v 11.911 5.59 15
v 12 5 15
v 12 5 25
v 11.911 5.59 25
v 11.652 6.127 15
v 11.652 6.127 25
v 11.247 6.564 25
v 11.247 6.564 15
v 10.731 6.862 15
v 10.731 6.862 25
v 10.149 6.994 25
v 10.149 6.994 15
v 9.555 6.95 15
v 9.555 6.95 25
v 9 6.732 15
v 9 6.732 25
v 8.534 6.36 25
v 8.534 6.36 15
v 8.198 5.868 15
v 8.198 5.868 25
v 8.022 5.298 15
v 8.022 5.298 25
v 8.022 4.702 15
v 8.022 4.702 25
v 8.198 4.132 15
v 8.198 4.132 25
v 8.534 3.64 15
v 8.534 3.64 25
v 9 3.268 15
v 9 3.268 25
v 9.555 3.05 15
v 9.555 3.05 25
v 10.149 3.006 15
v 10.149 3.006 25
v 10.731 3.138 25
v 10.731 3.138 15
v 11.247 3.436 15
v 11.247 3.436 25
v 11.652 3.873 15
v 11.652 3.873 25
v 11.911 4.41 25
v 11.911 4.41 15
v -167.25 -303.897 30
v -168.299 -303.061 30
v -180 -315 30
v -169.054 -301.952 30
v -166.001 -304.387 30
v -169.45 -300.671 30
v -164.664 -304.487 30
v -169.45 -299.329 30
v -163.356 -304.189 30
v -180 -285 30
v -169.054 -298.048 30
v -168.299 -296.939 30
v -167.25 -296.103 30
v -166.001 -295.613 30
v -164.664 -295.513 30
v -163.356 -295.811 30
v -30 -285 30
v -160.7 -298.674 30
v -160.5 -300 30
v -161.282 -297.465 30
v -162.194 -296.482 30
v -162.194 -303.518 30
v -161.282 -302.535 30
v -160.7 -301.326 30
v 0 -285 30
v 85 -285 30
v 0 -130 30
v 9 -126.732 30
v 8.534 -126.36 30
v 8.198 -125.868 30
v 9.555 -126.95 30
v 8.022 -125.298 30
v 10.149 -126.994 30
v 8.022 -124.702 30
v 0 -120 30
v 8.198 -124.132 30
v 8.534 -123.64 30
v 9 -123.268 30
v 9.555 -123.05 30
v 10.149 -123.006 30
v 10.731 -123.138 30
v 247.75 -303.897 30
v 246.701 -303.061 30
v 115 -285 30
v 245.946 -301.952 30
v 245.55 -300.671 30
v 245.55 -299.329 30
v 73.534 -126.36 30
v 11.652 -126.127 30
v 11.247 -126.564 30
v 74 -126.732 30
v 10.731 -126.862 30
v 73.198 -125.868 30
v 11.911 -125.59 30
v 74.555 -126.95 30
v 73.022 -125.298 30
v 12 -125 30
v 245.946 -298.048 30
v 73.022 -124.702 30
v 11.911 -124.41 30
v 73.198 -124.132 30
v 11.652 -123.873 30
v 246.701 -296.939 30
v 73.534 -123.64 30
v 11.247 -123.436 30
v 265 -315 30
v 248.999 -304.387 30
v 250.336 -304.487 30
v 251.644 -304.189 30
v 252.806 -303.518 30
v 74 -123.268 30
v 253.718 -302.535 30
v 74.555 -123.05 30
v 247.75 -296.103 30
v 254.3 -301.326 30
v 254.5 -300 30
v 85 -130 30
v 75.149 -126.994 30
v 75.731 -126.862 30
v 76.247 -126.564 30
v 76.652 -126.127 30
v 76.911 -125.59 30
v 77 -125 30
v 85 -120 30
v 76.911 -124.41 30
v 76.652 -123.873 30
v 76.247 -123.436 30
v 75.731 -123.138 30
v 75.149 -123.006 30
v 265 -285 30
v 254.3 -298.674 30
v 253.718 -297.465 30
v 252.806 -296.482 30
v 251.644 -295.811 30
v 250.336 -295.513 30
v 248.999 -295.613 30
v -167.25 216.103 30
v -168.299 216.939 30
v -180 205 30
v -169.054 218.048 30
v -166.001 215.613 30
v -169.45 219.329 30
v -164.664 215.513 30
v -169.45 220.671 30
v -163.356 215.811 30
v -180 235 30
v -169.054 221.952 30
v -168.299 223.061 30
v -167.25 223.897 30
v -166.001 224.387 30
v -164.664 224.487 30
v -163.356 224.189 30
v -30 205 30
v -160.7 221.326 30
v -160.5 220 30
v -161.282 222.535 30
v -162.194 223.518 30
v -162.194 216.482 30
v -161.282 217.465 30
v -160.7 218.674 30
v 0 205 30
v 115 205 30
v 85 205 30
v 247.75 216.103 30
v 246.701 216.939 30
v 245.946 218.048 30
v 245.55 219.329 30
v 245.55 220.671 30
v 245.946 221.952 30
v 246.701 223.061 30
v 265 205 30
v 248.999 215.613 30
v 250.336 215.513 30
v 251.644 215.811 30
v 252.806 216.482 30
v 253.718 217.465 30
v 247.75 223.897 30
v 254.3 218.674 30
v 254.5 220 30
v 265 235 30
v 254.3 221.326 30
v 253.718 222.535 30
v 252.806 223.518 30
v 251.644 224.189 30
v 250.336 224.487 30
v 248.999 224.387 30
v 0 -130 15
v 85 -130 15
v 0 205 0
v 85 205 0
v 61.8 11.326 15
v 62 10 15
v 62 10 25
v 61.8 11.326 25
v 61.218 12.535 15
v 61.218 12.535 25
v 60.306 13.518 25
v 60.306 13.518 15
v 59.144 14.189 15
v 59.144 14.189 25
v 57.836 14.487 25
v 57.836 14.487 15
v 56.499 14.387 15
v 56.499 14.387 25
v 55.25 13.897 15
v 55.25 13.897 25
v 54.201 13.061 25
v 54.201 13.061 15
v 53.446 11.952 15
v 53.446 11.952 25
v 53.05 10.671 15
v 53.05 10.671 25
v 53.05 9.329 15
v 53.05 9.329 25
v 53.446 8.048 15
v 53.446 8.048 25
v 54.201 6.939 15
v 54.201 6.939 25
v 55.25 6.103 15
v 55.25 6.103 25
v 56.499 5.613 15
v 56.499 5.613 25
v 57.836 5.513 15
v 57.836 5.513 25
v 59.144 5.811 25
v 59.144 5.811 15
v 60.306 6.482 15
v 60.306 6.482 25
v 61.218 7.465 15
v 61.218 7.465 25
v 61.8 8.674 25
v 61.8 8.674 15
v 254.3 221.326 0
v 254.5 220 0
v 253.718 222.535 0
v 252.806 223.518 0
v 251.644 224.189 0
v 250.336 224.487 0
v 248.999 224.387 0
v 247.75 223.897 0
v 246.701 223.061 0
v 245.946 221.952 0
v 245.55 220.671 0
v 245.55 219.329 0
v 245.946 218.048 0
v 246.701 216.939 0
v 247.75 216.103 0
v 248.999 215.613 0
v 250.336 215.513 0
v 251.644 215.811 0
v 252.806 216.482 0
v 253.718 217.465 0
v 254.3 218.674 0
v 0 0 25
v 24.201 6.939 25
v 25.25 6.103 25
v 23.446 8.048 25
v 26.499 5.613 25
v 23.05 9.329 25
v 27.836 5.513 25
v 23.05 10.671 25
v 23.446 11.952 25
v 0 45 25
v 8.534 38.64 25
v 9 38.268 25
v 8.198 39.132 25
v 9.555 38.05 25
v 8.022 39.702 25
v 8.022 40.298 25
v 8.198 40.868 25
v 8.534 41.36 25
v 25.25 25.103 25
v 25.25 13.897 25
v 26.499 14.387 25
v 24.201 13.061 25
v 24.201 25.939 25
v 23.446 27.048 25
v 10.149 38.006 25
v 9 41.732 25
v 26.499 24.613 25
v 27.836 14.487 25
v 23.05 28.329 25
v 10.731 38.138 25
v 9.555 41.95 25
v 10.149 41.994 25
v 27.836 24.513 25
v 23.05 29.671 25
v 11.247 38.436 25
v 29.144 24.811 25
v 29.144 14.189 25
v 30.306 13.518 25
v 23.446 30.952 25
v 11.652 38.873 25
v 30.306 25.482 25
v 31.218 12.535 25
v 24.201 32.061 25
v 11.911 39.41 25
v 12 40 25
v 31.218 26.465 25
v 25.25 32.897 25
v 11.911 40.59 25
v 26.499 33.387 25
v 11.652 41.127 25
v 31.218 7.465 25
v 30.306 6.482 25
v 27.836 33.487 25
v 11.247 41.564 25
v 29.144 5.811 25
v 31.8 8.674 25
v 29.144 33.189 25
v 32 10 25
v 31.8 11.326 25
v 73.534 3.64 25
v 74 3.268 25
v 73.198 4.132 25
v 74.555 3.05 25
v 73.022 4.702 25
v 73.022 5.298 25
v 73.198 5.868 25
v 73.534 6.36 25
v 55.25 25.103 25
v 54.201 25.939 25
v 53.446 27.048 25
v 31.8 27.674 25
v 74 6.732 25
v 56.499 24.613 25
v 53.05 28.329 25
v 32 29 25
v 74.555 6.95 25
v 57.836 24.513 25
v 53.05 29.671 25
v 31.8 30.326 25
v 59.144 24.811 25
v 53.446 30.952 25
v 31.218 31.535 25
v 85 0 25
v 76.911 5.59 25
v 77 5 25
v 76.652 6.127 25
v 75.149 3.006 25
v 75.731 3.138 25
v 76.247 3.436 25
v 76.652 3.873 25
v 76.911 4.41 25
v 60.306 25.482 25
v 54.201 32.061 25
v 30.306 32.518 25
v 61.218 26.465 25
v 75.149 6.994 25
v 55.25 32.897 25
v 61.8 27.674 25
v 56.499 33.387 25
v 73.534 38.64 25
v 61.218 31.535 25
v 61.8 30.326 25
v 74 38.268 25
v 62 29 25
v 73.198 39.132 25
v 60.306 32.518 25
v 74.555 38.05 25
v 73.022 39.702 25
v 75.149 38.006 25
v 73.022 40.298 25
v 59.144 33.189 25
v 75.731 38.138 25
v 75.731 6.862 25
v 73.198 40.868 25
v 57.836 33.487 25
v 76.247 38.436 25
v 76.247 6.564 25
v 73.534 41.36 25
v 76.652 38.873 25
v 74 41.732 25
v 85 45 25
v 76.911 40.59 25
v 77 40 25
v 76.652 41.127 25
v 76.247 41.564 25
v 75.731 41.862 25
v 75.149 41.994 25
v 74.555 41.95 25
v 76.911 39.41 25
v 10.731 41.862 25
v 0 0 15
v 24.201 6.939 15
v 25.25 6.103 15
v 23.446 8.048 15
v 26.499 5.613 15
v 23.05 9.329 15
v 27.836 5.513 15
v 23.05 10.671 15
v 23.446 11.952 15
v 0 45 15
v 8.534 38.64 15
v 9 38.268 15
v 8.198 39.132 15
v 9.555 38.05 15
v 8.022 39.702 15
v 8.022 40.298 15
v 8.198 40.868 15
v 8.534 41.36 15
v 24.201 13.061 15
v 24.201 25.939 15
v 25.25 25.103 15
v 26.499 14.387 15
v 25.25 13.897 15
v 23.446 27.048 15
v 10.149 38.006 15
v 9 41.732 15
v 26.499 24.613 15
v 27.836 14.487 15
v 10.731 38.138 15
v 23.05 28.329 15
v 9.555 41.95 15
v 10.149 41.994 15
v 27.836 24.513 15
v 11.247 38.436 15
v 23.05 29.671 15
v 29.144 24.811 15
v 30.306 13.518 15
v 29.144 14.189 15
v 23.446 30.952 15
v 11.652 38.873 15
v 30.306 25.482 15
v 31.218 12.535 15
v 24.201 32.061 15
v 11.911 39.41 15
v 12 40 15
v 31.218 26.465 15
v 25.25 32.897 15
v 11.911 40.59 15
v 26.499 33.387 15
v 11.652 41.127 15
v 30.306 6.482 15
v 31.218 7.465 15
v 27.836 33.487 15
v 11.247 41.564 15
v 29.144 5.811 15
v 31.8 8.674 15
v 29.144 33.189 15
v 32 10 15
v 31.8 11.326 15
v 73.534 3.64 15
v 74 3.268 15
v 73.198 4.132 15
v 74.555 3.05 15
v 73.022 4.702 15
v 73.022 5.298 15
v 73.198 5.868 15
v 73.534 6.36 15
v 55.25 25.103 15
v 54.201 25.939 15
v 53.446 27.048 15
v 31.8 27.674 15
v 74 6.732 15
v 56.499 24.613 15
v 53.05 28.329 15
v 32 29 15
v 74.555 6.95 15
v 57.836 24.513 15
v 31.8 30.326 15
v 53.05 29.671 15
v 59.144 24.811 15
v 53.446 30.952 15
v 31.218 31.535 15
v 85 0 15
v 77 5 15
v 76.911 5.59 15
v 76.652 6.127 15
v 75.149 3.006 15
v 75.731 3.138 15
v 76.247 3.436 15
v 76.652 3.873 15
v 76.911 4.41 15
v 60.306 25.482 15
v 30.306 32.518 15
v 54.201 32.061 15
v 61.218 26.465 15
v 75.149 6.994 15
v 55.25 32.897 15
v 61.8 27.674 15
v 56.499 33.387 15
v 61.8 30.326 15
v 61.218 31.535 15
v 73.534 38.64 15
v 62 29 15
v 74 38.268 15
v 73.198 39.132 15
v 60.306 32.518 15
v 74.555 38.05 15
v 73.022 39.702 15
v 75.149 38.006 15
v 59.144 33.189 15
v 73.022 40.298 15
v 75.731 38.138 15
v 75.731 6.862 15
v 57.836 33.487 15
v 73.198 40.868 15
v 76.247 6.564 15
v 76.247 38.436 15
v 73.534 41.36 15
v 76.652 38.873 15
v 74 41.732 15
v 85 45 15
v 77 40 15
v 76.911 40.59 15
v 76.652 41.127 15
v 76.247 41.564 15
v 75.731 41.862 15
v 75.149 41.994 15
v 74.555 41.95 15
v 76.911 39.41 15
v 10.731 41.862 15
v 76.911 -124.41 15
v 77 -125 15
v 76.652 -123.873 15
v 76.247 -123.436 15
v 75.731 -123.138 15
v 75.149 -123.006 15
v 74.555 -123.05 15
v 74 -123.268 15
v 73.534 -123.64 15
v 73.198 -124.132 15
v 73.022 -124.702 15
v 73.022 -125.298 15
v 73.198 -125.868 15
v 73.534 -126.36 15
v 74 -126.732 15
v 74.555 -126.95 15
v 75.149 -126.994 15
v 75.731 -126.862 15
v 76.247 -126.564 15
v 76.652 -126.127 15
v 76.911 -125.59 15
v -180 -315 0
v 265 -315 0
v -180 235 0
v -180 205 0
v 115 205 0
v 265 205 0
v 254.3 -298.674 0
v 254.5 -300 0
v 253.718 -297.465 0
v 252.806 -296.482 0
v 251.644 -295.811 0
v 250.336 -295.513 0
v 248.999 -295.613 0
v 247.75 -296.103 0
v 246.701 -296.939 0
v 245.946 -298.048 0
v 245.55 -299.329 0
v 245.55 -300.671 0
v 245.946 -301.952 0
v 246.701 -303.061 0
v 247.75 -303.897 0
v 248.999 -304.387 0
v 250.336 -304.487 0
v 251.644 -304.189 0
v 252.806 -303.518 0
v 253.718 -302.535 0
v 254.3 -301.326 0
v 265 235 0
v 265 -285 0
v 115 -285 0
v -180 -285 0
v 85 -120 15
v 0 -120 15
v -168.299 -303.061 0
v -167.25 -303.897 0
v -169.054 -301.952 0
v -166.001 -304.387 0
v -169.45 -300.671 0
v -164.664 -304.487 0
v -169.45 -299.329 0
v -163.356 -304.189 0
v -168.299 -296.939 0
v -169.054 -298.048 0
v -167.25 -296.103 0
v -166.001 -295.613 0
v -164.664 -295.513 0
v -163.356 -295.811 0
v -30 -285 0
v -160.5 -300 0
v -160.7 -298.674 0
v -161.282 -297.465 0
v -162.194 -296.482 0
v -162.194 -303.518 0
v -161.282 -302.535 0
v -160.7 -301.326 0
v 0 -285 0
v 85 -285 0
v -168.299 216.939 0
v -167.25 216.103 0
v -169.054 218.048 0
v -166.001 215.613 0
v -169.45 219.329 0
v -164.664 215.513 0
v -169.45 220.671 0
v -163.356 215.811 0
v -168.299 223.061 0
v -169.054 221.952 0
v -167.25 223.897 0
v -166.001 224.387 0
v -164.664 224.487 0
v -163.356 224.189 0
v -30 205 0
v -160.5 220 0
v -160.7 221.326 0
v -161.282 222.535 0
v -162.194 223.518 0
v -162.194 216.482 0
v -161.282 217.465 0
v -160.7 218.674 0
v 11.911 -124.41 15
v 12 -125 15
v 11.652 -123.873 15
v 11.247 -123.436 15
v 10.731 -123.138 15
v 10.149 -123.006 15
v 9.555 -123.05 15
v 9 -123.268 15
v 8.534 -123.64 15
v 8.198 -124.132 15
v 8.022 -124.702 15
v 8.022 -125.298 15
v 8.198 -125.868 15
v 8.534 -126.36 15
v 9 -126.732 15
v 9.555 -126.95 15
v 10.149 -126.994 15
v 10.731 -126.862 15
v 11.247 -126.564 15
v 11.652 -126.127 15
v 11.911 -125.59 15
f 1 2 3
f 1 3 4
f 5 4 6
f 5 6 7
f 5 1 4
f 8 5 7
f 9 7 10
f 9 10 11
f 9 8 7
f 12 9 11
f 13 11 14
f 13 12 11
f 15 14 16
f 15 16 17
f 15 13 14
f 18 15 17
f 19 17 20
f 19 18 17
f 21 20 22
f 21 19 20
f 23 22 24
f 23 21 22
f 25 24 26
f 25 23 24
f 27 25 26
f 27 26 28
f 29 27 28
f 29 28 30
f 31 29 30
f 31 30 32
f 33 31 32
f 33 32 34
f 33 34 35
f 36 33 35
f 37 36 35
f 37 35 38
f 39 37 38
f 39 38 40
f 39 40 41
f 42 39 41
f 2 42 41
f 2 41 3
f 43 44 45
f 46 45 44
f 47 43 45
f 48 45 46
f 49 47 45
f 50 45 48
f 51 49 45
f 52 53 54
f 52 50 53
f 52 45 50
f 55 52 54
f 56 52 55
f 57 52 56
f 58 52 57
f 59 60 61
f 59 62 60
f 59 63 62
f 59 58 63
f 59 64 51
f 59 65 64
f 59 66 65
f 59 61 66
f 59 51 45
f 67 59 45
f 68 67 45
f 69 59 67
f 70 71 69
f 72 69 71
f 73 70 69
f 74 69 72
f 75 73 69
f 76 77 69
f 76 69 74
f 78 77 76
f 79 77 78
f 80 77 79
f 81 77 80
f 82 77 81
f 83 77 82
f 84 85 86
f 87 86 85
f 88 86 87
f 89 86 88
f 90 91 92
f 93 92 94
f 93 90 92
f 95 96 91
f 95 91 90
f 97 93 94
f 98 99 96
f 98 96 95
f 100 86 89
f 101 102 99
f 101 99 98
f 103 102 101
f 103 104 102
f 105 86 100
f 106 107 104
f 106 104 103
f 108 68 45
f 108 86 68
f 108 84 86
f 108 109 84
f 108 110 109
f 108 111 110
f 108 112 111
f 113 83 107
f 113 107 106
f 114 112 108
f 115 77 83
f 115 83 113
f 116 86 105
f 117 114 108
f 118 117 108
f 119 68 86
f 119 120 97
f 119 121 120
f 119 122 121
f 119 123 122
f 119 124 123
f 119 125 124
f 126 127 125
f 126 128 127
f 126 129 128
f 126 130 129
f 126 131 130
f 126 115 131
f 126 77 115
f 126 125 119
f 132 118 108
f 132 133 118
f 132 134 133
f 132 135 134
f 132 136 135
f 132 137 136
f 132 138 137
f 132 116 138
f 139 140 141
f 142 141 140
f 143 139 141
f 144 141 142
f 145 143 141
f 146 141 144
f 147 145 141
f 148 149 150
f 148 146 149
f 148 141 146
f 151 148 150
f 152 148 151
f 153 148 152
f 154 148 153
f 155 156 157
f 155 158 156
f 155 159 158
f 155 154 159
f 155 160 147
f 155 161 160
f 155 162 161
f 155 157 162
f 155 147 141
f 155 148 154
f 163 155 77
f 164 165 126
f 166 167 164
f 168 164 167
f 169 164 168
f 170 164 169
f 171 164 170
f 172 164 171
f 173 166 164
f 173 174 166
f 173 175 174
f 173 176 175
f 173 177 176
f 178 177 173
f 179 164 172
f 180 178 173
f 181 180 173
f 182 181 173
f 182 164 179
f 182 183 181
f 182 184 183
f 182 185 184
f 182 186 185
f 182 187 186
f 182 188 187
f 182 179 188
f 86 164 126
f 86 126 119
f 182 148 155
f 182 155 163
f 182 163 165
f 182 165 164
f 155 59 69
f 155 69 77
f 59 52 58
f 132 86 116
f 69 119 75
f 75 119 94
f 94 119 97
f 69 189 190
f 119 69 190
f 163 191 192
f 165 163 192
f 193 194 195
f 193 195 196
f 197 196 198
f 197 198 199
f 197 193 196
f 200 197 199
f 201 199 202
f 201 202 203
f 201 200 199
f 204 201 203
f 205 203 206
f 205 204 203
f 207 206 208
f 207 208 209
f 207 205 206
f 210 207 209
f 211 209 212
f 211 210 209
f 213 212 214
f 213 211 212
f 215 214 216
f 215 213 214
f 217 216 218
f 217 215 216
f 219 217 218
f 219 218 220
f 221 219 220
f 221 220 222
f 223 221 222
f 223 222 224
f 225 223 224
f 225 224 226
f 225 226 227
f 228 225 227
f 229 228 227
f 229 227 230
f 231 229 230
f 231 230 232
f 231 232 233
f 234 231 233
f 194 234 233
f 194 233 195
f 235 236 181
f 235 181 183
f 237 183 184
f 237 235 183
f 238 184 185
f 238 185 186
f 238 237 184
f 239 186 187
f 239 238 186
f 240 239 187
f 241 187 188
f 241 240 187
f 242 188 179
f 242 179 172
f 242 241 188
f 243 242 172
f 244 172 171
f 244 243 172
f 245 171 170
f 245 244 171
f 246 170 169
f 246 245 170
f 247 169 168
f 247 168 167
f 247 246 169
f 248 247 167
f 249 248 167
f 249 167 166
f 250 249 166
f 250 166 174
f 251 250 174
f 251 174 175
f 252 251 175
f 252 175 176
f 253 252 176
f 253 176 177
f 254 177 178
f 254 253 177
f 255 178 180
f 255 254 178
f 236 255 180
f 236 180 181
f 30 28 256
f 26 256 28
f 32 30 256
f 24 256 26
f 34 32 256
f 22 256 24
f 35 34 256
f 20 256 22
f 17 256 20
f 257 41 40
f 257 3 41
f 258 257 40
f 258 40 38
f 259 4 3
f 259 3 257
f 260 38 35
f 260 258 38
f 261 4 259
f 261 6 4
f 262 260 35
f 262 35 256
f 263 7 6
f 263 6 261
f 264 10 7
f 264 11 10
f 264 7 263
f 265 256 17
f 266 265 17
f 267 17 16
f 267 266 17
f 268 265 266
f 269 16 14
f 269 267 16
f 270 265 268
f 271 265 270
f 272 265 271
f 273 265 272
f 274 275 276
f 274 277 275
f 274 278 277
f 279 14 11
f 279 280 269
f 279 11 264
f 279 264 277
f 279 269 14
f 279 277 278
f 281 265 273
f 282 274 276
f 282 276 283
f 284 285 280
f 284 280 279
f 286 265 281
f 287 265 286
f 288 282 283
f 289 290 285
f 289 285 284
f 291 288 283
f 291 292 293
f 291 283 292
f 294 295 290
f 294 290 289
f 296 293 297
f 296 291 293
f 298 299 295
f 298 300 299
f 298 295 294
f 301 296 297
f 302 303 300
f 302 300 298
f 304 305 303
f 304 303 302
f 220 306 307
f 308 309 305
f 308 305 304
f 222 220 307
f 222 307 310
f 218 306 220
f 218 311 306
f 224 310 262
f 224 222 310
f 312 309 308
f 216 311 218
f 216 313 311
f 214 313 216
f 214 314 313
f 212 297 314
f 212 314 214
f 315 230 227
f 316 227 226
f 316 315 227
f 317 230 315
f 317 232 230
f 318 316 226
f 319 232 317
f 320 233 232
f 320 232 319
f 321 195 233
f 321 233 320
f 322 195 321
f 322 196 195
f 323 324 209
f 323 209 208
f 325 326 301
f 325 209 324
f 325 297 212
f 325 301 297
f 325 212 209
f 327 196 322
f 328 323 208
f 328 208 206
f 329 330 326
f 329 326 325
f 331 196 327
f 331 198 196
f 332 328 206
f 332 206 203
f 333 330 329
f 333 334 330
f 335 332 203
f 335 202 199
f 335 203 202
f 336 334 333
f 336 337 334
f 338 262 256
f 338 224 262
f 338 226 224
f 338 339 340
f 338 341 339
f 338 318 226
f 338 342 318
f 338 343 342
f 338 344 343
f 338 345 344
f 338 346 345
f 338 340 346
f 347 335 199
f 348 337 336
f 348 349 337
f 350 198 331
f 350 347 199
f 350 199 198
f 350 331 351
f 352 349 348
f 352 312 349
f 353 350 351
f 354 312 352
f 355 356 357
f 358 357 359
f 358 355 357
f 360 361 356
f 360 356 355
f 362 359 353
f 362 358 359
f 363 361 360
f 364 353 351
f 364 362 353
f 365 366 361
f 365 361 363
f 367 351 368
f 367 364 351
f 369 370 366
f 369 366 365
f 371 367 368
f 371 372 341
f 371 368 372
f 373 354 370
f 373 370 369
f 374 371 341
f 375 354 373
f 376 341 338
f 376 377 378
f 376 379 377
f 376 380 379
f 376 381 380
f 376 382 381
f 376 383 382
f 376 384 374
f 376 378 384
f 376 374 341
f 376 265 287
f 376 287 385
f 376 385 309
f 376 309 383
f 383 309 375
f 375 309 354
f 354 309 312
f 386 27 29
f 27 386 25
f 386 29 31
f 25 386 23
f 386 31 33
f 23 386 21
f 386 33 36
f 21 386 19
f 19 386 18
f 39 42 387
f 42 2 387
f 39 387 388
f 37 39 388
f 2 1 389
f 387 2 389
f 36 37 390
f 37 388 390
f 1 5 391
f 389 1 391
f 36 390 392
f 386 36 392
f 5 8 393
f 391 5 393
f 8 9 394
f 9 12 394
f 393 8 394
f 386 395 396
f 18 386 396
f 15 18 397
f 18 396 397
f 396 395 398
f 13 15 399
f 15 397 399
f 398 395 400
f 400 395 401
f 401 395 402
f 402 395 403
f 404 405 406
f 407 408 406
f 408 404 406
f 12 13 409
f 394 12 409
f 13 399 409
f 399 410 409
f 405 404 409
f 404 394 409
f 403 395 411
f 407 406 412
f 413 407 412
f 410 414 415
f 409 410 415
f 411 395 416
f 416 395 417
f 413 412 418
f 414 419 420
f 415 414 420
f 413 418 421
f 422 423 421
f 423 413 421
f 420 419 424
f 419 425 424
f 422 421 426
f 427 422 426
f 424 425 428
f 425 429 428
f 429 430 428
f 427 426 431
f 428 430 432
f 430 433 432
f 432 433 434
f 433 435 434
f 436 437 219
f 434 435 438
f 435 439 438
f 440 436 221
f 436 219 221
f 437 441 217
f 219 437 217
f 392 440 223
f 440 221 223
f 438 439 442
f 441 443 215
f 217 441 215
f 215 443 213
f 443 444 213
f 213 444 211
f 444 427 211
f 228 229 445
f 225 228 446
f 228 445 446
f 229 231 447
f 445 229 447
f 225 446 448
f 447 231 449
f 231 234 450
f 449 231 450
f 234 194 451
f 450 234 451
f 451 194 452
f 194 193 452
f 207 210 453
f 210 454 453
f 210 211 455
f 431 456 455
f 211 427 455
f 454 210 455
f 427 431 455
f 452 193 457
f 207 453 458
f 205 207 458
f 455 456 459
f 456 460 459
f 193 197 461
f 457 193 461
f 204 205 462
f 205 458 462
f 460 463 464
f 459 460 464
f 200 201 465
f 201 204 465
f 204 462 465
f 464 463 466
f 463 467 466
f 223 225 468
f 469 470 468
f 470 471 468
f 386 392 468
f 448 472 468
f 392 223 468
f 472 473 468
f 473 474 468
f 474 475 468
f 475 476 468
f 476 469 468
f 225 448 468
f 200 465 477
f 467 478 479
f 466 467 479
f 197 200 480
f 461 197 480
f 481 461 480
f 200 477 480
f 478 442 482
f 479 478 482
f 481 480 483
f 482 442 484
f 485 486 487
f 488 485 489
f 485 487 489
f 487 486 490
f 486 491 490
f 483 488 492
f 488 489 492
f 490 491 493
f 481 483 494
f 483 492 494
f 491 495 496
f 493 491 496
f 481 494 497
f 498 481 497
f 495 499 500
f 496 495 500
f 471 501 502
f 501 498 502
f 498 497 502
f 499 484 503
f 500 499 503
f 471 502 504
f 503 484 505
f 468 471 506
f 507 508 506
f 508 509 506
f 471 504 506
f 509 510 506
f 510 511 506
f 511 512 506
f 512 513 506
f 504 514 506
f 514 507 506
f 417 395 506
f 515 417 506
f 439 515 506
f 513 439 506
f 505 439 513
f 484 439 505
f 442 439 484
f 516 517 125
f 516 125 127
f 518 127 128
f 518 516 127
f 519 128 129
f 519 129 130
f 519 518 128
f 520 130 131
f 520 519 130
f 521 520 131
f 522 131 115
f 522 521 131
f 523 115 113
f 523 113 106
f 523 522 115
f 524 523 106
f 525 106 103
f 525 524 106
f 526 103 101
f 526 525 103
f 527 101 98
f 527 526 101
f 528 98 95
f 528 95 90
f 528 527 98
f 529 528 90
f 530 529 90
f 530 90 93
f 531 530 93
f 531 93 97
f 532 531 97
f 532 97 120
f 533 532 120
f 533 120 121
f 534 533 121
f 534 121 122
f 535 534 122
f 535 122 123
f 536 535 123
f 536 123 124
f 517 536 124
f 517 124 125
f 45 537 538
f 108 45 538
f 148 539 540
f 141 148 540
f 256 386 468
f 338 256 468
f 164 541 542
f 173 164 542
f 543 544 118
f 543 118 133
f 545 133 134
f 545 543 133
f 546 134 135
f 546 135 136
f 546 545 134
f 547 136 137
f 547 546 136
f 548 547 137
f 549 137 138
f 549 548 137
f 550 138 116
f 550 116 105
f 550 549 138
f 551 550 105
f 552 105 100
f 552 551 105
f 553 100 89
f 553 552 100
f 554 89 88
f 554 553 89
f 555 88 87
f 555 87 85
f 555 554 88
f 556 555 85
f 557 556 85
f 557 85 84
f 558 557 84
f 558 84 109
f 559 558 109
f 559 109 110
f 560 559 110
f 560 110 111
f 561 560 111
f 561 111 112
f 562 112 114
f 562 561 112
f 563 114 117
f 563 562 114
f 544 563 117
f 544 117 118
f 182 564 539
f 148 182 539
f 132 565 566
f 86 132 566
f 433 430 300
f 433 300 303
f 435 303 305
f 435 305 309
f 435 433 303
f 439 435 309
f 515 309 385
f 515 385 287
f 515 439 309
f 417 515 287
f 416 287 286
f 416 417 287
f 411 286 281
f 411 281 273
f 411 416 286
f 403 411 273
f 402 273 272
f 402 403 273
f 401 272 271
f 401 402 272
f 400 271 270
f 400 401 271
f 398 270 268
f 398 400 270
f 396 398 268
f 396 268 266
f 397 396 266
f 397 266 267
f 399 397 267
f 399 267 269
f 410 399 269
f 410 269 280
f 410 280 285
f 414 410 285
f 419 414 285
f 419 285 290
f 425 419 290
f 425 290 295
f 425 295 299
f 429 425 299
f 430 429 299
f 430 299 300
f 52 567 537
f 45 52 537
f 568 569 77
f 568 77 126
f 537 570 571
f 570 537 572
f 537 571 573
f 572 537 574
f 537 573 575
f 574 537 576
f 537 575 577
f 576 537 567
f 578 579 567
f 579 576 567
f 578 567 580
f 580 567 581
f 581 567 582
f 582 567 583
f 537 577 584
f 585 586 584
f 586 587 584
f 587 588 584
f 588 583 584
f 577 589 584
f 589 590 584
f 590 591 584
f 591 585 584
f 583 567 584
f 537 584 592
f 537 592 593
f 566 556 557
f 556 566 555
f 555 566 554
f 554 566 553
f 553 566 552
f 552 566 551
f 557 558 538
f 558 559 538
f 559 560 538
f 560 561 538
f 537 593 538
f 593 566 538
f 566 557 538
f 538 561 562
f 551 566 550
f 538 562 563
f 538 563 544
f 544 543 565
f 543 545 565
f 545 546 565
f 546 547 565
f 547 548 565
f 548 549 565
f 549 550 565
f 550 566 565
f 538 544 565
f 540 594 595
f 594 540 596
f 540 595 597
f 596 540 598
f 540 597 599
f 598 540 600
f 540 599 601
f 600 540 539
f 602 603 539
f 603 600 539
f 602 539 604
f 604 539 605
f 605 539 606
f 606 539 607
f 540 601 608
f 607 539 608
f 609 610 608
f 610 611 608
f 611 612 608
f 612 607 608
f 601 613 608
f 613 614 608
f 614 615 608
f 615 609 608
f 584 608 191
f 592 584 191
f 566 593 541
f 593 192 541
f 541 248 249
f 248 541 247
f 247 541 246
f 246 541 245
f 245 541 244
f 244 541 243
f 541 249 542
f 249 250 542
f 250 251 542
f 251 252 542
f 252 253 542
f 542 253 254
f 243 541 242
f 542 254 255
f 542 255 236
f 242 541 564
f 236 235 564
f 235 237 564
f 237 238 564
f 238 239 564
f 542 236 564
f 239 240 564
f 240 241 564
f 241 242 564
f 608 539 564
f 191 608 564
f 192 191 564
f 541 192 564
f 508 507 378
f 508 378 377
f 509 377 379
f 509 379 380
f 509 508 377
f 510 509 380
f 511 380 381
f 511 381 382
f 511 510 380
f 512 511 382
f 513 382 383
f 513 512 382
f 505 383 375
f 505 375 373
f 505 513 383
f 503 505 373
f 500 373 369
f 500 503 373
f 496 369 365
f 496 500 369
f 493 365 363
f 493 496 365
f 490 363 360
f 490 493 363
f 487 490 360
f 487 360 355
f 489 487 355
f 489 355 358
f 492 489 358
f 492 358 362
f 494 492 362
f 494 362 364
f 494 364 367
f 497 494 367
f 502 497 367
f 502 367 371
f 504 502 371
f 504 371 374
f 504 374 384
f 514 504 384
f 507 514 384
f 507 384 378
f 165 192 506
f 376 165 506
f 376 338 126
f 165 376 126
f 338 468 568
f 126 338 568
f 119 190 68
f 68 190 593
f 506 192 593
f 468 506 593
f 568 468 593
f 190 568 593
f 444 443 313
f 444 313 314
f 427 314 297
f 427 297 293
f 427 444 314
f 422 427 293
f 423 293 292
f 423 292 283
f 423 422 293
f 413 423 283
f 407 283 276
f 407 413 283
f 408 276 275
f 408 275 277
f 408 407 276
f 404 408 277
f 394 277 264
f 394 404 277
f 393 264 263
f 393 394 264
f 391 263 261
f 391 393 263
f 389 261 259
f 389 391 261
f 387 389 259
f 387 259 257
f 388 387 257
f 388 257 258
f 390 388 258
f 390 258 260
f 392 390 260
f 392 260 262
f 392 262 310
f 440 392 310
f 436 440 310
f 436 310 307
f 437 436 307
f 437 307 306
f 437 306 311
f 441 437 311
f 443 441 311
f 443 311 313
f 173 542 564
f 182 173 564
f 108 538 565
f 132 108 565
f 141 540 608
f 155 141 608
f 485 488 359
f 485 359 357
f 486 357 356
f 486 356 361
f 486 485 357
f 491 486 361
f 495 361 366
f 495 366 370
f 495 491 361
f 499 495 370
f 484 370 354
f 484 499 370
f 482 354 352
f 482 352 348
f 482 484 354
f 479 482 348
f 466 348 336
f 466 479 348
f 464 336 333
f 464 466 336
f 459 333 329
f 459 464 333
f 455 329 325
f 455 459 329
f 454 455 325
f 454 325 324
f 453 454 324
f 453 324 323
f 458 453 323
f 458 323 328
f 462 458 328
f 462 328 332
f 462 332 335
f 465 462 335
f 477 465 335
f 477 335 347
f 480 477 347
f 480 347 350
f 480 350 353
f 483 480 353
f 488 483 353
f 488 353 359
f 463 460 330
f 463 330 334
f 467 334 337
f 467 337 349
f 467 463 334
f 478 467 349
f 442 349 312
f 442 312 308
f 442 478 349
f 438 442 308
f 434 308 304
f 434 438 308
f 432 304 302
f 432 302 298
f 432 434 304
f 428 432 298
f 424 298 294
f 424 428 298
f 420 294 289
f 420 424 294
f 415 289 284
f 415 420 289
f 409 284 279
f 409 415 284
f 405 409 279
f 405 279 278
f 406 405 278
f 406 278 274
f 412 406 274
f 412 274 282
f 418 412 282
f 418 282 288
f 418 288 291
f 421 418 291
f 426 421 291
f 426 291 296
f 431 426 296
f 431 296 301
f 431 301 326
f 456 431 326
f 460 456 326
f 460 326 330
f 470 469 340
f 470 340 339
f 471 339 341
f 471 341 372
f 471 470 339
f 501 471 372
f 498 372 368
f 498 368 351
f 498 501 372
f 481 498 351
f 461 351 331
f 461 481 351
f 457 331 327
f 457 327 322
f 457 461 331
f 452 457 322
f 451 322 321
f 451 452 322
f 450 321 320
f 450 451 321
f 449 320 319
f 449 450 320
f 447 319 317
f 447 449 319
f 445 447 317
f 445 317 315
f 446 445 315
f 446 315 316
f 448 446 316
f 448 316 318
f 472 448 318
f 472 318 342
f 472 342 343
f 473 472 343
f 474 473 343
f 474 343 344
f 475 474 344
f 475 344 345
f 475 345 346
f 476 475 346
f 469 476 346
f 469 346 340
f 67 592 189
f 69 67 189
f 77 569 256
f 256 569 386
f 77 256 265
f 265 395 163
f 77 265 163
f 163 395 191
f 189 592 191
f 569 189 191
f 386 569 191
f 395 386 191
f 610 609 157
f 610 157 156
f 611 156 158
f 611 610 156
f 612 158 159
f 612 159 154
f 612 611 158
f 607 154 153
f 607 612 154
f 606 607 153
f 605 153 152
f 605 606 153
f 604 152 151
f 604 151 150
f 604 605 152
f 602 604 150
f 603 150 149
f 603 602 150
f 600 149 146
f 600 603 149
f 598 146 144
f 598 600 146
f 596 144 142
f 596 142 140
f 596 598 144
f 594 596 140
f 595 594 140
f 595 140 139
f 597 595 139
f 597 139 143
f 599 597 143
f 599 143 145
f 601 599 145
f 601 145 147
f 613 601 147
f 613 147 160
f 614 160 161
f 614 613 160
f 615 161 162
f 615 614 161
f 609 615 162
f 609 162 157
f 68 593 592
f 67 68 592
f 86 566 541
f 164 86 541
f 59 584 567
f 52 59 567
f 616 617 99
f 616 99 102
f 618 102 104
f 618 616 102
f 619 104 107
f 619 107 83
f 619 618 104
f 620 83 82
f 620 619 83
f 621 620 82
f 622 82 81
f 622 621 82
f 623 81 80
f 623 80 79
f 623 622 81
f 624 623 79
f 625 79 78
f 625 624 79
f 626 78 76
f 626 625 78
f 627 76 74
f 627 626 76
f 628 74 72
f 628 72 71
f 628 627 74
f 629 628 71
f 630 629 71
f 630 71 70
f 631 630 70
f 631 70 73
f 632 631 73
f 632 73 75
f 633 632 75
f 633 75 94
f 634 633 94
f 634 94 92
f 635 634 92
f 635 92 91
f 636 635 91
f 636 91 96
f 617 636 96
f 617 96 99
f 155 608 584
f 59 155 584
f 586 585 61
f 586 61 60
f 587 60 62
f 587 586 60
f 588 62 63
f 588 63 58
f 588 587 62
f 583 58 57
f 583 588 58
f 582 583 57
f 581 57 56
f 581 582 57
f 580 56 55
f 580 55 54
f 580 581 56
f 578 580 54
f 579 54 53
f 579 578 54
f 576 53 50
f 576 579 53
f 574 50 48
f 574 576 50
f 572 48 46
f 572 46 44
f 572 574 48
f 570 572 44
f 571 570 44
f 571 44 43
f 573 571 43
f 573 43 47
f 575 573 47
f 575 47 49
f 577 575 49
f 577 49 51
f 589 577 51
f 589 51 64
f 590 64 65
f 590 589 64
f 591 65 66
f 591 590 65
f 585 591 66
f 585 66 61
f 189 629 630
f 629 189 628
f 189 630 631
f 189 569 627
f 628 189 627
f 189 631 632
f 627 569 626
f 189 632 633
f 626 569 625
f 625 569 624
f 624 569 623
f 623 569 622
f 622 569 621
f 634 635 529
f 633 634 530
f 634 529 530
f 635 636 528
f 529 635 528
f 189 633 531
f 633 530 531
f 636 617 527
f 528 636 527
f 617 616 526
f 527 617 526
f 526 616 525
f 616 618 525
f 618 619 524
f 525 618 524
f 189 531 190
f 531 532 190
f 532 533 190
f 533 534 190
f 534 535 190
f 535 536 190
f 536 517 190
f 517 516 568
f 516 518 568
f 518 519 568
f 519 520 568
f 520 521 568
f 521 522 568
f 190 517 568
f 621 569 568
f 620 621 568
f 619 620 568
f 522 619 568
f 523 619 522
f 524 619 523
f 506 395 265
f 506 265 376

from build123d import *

# Parameters (mm, degrees)
F0_R     = 4.5
F0_W     = 85
F0_H     = 160
F0_H_2   = 10
F0_R_2   = 2
F1_DEPTH = 30
F2_W     = 85
F2_H     = 40
F2_R     = 4.5
F2_H_2   = 5
F3_DEPTH = 5
F4_W     = 85
F4_H     = 45
F4_R     = 2
F4_R_2   = 6
F5_DEPTH = 15
F4_R_3   = 4.5
F6_DEPTH = 15
F7_DEPTH = 25


with BuildPart() as f1:
    # F0 (on Top) → F1 (new body)
    with BuildSketch(Plane.XY):
        Polygon((115, -285), (115, 205), (265, 205), (265, 235), (-180, 235), (-180, 205), (-30, 205), (-30, -285), (-180, -285), (-180, -315), (265, -315), (265, -285), align=None)
        with Locations((-165, -300)):
            Circle(F0_R, mode=Mode.SUBTRACT)
        with Locations((250, -300)):
            Circle(F0_R, mode=Mode.SUBTRACT)
        Polygon((0, -120), (0, 0), (85, 0), (85, -120), (85, -130), (85, -285), (0, -285), (0, -130), align=None, mode=Mode.SUBTRACT)
        with Locations((27.5, 10)):
            Circle(F0_R, mode=Mode.SUBTRACT)
        with Locations((27.5, 29)):
            Circle(F0_R, mode=Mode.SUBTRACT)
        with Locations((-165, 220)):
            Circle(F0_R, mode=Mode.SUBTRACT)
        with Locations((57.5, 10)):
            Circle(F0_R, mode=Mode.SUBTRACT)
        with Locations((57.5, 29)):
            Circle(F0_R, mode=Mode.SUBTRACT)
        with Locations((42.5, 125)):
            Rectangle(F0_W, F0_H, mode=Mode.SUBTRACT)
        with Locations((250, 220)):
            Circle(F0_R, mode=Mode.SUBTRACT)
        with Locations((42.5, -125)):
            Rectangle(F0_W, F0_H_2)
        with Locations((10, -125)):
            Circle(F0_R_2, mode=Mode.SUBTRACT)
        with Locations((75, -125)):
            Circle(F0_R_2, mode=Mode.SUBTRACT)
    extrude(amount=F1_DEPTH)

    # F2 (on face) → F3 (cut)
    with BuildSketch(Plane.XY.offset(30)):
        with Locations((42.5, 20)):
            Rectangle(F2_W, F2_H)
        with Locations((27.5, 10)):
            Circle(F2_R, mode=Mode.SUBTRACT)
        with Locations((27.5, 29)):
            Circle(F2_R, mode=Mode.SUBTRACT)
        with Locations((57.5, 10)):
            Circle(F2_R, mode=Mode.SUBTRACT)
        with Locations((57.5, 29)):
            Circle(F2_R, mode=Mode.SUBTRACT)
        with Locations((42.5, 42.5)):
            Rectangle(F2_W, F2_H_2)
    extrude(amount=-F3_DEPTH, mode=Mode.SUBTRACT)

    # F4 (on face) + F0 (on Top) → F5 (cut)
    with BuildSketch(Plane.XY):
        with Locations((42.5, 22.5)):
            Rectangle(F4_W, F4_H)
        with Locations((10, 5)):
            Circle(F4_R, mode=Mode.SUBTRACT)
        with Locations((27.5, 10)):
            Circle(F4_R_2, mode=Mode.SUBTRACT)
        with Locations((10, 40)):
            Circle(F4_R, mode=Mode.SUBTRACT)
        with Locations((27.5, 29)):
            Circle(F4_R_2, mode=Mode.SUBTRACT)
        with Locations((57.5, 10)):
            Circle(F4_R_2, mode=Mode.SUBTRACT)
        with Locations((75, 5)):
            Circle(F4_R, mode=Mode.SUBTRACT)
        with Locations((57.5, 29)):
            Circle(F4_R_2, mode=Mode.SUBTRACT)
        with Locations((75, 40)):
            Circle(F4_R, mode=Mode.SUBTRACT)
    with BuildSketch(Plane.XY):
        with Locations((42.5, -125)):
            Rectangle(F0_W, F0_H_2)
        with Locations((10, -125)):
            Circle(F0_R_2, mode=Mode.SUBTRACT)
        with Locations((75, -125)):
            Circle(F0_R_2, mode=Mode.SUBTRACT)
    extrude(amount=F5_DEPTH, mode=Mode.SUBTRACT)

    # F4 (on face) → F6 (cut)
    with BuildSketch(Plane.XY):
        with Locations((27.5, 10)):
            Circle(F4_R_2)
        with Locations((27.5, 10)):
            Circle(F4_R_3, mode=Mode.SUBTRACT)
        with Locations((57.5, 10)):
            Circle(F4_R_2)
        with Locations((57.5, 10)):
            Circle(F4_R_3, mode=Mode.SUBTRACT)
        with Locations((57.5, 29)):
            Circle(F4_R_2)
        with Locations((57.5, 29)):
            Circle(F4_R_3, mode=Mode.SUBTRACT)
        with Locations((27.5, 29)):
            Circle(F4_R_2)
        with Locations((27.5, 29)):
            Circle(F4_R_3, mode=Mode.SUBTRACT)
    extrude(amount=F6_DEPTH, mode=Mode.SUBTRACT)

    # F4 (on face) → F7 (cut)
    with BuildSketch(Plane.XY):
        with Locations((10, 5)):
            Circle(F4_R)
        with Locations((10, 40)):
            Circle(F4_R)
        with Locations((75, 40)):
            Circle(F4_R)
        with Locations((75, 5)):
            Circle(F4_R)
    extrude(amount=F7_DEPTH, mode=Mode.SUBTRACT)


solid = f1.part
